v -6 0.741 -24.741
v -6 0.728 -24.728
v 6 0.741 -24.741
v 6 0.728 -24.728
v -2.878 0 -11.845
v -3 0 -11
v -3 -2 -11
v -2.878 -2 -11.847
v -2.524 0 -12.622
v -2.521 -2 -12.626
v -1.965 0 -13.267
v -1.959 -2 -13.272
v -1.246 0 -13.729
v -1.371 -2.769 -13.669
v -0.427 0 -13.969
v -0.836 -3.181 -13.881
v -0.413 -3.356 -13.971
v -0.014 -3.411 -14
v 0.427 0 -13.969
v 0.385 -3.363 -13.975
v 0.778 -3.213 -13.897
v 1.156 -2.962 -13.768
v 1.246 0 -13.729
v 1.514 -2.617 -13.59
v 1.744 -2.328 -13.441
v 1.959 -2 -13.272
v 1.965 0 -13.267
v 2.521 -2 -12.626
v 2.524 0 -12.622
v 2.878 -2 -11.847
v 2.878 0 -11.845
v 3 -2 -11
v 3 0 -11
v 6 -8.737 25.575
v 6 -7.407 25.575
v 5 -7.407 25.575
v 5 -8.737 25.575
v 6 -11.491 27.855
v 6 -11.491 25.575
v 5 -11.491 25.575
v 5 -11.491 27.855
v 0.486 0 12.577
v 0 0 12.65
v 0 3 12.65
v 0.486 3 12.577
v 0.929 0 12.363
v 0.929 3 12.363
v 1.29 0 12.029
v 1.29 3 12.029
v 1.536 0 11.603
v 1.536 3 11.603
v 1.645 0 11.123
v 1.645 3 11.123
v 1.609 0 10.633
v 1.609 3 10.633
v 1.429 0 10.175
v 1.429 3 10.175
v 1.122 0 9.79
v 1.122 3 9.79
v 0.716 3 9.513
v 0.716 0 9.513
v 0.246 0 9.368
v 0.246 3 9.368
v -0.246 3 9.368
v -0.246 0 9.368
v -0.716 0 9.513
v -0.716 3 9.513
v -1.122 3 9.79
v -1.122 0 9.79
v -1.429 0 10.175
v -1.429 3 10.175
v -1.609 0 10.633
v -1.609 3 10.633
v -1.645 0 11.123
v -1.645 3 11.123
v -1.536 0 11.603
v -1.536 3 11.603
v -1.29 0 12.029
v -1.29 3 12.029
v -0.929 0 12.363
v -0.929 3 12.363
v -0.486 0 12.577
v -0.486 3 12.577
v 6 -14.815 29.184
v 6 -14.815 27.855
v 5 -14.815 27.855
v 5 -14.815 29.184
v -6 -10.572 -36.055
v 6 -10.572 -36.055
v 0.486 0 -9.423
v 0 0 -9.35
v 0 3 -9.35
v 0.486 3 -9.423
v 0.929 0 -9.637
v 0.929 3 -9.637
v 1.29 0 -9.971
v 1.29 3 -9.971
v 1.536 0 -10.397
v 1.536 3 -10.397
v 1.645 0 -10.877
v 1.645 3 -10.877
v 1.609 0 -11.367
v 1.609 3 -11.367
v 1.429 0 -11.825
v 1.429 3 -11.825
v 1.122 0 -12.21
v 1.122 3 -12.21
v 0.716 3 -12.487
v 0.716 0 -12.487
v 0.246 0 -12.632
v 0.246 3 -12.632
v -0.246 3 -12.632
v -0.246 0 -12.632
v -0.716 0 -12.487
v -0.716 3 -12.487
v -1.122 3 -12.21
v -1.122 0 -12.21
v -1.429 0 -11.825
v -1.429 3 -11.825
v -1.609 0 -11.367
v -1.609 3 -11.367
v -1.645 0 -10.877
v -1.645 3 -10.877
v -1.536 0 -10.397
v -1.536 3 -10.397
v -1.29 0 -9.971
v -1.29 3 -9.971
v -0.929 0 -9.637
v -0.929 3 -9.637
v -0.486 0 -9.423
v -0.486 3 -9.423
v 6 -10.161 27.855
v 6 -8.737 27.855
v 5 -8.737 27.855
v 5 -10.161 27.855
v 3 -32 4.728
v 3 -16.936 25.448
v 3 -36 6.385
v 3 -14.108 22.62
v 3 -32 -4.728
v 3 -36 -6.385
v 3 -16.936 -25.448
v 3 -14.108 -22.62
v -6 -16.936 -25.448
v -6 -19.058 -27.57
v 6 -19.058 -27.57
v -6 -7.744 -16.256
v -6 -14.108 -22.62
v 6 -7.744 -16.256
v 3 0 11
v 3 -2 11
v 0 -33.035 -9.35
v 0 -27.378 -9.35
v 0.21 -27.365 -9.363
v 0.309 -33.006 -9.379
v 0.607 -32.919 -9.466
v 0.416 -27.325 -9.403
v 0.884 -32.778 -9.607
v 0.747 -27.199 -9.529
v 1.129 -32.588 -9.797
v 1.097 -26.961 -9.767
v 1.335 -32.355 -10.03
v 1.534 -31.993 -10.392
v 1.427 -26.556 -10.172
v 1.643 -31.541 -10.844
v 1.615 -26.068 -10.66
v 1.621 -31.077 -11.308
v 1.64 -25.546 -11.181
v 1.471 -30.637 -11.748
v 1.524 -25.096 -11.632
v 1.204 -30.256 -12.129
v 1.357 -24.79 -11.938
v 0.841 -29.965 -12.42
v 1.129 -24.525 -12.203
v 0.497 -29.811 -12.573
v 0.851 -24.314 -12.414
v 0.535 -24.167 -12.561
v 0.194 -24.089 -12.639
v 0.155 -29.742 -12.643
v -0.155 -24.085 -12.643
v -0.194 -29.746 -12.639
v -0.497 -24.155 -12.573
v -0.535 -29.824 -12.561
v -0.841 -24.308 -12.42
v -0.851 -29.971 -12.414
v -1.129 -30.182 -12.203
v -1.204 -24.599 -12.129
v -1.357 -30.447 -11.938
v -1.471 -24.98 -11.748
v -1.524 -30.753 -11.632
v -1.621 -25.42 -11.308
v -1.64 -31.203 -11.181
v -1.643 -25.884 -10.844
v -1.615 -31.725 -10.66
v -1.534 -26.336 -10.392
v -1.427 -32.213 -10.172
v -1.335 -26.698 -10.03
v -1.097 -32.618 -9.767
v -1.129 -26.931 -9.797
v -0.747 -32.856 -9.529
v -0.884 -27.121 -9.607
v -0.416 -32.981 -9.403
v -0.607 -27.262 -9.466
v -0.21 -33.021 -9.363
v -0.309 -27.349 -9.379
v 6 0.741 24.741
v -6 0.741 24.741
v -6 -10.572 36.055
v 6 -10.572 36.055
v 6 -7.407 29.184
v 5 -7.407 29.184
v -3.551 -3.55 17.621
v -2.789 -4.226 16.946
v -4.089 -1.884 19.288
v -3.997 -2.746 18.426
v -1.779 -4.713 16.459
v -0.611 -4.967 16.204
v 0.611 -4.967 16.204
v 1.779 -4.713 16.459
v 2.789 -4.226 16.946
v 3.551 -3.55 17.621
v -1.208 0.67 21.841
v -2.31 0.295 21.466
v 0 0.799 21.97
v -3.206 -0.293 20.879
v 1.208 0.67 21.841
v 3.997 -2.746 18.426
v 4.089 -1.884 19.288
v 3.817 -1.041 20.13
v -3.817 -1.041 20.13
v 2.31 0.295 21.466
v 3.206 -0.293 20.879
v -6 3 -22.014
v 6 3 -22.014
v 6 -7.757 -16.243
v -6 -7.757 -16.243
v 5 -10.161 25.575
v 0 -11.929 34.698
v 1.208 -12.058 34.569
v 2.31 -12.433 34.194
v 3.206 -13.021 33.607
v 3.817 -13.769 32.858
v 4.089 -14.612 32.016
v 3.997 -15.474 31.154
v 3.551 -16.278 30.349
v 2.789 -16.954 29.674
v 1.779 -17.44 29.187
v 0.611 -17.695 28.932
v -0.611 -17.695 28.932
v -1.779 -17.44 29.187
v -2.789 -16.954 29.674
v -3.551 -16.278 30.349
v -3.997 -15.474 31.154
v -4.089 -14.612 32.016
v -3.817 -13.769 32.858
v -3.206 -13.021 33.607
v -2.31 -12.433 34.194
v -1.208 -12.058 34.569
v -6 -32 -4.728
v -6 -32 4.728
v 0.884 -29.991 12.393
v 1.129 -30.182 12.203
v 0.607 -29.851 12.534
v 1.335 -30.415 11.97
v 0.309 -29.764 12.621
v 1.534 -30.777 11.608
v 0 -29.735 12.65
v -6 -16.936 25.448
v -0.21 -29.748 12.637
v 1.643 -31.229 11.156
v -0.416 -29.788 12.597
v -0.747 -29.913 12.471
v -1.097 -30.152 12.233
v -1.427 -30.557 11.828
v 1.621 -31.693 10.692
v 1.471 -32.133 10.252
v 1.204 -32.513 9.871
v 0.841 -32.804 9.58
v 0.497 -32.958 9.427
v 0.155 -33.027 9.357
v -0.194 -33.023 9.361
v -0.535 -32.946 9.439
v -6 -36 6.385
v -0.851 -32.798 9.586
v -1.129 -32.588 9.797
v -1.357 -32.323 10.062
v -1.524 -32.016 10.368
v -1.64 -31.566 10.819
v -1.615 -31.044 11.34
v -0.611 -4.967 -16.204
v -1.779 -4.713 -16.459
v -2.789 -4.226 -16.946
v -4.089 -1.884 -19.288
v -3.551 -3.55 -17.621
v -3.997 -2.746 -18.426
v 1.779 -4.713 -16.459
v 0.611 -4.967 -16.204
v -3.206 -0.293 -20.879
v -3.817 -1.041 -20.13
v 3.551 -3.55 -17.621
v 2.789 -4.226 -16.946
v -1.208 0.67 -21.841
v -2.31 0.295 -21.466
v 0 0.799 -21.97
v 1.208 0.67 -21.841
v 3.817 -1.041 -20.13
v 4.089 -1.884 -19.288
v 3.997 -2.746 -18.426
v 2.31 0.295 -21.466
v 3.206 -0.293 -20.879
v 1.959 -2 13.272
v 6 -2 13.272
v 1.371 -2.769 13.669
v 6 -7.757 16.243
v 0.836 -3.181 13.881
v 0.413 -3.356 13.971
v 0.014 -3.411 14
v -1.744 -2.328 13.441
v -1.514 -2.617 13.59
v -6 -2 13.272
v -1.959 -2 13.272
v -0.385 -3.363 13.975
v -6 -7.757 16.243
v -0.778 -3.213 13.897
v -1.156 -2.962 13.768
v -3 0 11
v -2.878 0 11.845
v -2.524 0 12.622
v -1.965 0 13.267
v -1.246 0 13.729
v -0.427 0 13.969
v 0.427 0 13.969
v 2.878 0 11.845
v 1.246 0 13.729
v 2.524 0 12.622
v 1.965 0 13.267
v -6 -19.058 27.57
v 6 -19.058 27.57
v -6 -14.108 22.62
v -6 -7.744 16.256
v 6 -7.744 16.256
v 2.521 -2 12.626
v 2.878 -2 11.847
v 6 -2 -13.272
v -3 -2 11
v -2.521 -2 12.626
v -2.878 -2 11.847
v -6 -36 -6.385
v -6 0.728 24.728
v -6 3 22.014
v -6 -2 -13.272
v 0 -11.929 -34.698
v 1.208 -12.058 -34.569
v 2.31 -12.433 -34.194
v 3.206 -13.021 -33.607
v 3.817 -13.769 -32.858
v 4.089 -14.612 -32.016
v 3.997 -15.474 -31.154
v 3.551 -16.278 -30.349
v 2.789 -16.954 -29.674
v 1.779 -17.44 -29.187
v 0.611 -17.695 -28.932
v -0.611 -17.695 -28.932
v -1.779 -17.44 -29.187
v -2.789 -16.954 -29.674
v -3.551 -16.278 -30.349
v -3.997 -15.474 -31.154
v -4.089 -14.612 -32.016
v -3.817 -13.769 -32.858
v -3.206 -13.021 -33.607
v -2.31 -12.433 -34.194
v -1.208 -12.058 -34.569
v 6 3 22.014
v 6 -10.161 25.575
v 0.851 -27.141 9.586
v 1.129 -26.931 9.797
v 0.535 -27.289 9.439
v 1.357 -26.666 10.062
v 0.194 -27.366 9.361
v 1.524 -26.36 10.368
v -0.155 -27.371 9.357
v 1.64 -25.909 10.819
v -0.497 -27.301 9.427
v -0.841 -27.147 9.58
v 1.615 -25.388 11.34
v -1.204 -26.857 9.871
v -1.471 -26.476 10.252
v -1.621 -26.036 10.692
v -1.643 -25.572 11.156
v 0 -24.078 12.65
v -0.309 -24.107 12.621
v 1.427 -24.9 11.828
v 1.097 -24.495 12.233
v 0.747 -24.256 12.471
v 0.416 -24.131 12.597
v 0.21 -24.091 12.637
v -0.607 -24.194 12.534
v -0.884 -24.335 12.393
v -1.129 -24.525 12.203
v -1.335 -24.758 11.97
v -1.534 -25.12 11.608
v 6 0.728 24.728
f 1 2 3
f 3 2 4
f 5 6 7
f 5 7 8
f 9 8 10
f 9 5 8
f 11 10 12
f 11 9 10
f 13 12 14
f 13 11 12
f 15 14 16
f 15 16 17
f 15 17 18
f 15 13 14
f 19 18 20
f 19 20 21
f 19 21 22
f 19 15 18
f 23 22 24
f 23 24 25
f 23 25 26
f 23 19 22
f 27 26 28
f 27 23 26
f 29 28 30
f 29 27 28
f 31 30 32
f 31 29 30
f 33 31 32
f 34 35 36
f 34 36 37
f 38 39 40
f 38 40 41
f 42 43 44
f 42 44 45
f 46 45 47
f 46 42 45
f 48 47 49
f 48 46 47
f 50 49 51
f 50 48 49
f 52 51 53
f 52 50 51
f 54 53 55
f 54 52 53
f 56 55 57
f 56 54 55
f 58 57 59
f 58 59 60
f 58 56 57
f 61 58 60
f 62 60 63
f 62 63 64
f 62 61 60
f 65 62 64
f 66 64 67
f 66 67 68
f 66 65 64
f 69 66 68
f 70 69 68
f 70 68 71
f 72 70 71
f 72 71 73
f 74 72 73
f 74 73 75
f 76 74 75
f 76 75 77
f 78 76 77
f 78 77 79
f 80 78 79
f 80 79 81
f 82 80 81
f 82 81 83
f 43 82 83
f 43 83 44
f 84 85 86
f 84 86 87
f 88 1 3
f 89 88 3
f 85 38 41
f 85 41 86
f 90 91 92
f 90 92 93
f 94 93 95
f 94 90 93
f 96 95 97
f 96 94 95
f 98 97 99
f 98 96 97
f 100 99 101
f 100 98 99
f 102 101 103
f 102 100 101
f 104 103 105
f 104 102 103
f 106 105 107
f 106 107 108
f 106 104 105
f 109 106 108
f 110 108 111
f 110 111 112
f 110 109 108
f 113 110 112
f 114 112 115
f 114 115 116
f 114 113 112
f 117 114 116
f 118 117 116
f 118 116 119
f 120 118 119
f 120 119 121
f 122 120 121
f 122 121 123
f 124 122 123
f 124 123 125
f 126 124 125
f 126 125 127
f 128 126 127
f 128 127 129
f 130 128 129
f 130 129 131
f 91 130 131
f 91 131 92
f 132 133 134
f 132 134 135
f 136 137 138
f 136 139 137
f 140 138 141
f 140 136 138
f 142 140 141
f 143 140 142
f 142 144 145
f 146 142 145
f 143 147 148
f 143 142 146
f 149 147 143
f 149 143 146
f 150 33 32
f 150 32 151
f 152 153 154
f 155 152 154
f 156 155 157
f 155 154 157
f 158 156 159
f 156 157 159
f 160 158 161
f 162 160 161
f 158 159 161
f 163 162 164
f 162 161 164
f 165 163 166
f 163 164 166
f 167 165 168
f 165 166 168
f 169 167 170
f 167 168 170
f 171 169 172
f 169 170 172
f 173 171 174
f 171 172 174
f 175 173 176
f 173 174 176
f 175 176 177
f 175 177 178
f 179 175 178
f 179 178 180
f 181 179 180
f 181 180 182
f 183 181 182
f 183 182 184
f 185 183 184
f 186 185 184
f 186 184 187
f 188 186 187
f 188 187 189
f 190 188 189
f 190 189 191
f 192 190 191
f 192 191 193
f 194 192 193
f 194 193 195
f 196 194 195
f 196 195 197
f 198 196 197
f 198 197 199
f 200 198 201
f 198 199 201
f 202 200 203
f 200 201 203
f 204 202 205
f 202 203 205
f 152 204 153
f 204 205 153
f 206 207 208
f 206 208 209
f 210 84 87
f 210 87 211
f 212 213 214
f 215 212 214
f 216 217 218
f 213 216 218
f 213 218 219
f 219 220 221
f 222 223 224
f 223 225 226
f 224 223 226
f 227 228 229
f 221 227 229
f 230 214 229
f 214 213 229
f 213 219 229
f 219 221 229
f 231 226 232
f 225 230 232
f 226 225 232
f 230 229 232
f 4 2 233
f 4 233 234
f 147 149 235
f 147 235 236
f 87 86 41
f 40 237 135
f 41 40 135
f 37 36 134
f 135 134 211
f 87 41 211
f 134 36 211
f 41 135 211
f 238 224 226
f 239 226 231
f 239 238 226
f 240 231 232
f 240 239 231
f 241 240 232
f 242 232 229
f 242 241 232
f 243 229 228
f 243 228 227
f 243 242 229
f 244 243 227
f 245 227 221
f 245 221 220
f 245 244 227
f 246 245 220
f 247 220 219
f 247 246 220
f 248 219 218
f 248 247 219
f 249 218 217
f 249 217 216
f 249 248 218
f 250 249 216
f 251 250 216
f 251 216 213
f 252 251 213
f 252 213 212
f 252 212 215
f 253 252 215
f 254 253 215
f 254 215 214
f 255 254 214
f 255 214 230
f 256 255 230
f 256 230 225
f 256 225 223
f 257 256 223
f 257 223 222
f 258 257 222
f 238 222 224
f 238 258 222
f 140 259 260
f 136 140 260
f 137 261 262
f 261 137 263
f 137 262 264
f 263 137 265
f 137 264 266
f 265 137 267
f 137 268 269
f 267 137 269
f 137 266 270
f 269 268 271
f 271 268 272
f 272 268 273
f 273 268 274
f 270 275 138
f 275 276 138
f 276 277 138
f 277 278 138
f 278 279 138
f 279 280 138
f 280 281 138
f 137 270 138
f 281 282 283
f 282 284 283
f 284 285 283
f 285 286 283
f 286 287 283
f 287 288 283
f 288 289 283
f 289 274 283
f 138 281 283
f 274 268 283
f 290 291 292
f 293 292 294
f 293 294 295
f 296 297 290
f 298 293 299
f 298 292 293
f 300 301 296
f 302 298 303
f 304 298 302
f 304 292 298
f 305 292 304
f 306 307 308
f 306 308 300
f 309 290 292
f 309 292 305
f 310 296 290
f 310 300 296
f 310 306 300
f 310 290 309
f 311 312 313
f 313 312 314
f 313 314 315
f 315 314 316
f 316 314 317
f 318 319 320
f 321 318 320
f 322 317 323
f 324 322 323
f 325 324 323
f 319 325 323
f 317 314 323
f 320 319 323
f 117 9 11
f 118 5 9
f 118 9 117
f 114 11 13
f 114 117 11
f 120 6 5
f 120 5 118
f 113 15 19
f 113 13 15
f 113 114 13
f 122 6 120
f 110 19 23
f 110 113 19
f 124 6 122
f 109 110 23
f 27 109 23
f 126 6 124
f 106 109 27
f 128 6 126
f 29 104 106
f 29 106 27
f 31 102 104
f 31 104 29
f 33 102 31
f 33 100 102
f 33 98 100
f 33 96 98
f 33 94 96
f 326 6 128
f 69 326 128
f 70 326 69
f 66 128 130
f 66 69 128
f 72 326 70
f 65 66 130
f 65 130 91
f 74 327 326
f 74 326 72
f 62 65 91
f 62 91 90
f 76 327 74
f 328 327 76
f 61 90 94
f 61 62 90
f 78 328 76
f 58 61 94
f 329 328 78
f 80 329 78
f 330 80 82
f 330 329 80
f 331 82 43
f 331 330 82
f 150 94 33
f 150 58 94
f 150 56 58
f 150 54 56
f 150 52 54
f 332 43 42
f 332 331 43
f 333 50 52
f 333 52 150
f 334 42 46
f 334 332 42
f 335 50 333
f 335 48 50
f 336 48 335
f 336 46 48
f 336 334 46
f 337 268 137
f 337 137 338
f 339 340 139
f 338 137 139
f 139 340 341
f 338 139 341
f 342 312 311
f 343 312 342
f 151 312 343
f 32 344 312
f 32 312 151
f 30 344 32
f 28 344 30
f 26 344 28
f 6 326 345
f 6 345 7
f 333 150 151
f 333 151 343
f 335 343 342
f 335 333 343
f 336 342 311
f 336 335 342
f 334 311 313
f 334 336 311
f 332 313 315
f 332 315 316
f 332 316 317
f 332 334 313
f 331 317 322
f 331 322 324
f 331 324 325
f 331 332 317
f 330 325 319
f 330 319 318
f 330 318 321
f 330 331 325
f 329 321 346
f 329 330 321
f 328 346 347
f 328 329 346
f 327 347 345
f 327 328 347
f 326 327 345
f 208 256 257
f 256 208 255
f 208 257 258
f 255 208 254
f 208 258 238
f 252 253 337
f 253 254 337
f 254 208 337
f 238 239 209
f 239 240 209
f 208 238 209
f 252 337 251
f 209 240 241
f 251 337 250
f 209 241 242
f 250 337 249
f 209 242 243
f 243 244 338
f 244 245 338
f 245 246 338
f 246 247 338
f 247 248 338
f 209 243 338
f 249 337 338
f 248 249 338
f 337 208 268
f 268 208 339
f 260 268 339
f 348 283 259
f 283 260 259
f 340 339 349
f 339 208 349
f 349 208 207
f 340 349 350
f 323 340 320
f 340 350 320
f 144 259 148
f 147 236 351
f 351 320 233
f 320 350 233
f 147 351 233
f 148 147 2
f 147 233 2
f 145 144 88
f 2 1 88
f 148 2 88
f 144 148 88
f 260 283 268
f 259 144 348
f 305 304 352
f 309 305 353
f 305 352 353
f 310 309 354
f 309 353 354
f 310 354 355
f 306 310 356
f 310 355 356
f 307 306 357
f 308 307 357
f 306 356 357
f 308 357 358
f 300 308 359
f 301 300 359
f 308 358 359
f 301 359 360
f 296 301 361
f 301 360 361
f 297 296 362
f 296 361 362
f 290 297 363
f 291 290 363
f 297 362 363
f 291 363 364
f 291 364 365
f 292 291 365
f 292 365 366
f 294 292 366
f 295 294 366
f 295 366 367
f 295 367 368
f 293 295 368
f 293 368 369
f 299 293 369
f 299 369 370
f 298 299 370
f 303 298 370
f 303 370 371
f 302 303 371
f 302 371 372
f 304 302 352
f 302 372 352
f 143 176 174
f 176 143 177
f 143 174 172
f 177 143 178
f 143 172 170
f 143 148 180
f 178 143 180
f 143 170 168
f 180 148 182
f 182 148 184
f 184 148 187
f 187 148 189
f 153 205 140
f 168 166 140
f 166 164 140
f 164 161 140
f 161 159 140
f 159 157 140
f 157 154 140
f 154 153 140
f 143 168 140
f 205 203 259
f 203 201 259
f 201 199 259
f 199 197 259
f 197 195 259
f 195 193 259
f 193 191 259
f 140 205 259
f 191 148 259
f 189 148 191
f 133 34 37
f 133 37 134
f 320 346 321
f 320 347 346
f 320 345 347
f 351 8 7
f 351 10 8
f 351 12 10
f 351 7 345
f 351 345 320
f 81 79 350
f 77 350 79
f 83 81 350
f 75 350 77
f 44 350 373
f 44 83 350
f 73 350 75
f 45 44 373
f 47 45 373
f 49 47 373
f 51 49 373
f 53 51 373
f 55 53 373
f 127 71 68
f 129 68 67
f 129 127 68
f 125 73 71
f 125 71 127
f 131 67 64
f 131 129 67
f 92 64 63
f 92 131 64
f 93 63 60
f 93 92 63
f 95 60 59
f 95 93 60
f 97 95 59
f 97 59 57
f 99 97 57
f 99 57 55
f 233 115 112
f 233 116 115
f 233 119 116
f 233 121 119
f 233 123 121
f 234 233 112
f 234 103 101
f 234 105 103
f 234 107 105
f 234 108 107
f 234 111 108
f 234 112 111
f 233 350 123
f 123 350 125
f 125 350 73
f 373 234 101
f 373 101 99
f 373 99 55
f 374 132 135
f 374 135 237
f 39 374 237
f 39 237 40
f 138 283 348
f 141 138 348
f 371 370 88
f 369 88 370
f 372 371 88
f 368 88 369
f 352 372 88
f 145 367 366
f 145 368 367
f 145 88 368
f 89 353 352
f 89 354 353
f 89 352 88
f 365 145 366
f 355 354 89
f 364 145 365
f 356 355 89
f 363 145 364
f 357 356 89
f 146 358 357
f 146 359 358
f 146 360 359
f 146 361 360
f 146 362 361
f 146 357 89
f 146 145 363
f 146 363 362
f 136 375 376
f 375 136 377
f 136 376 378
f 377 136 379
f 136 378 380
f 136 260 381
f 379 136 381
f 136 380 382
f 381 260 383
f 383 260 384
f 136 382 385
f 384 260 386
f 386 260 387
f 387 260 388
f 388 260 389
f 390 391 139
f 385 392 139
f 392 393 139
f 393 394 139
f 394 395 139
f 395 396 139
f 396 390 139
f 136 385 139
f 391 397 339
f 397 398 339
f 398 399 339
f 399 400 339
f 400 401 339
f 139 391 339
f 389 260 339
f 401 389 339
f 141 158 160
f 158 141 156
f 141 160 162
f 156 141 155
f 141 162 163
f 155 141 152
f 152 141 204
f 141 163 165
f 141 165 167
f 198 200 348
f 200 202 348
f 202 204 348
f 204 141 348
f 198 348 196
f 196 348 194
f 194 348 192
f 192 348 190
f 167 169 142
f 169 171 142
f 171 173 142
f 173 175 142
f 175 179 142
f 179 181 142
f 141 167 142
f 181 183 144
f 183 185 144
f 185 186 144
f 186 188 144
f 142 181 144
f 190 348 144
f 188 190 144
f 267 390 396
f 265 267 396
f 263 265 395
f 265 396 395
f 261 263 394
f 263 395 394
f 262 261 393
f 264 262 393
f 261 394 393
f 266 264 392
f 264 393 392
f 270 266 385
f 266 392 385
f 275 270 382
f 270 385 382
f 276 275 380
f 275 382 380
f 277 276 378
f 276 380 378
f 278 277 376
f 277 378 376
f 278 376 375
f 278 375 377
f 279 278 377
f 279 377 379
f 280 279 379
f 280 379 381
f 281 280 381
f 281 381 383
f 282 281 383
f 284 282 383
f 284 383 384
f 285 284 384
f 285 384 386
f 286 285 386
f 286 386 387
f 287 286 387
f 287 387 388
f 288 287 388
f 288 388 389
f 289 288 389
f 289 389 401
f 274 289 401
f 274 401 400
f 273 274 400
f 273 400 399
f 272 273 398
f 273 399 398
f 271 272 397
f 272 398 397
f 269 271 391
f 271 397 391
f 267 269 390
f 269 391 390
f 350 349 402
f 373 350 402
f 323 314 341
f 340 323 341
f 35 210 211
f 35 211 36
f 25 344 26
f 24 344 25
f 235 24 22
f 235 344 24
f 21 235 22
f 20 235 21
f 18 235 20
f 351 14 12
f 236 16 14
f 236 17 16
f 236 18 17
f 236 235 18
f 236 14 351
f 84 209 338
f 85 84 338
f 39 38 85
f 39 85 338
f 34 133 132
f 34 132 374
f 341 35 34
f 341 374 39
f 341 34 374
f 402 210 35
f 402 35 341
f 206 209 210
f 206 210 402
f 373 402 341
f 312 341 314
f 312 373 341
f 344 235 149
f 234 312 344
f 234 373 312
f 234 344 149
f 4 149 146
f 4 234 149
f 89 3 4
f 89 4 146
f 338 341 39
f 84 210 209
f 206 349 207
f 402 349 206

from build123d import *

# Parameters (mm, degrees)
SZKIC2_R                         = 1.65
DODANIE_WYCI_GNI_CIE1_DEPTH      = 3
DODANIE_WYCI_GNI_CIE2_DEPTH      = 5
DODANIE_WYCI_GNI_CIE3_REACH      = 30.62
DODANIE_WYCI_GNI_CIE3_START      = -1
SZKIC7_R                         = 5
SZKIC9_W                         = 12
SZKIC9_H                         = 12
DODANIE_WYCI_GNI_CIE4_DEPTH      = 16
SZKIC10_R                        = 4.1
WYTNIJ_WYCI_GNI_CIE1_DEPTH       = 18
SZKIC12_R                        = 37.17284924
WYTNIJ_WYCI_GNI_CIE2_DEPTH       = 43.690783477
SZKIC13_R                        = 3
WYTNIJ_WYCI_GNI_CIE3_DEPTH       = 42.220824259
SZKIC14_R                        = 1.65
WYTNIJ_WYCI_GNI_CIE4_DEPTH       = 42.220824259
DODANIE_WYCI_GNI_CIE5_DEPTH      = 3
DODANIE_WYCI_GNI_CIE5_DEPTH_BACK = 6
DODANIE_WYCI_GNI_CIE6_REACH      = 55.451
SZKIC16_W                        = 12
SZKIC16_H                        = 5.223766812
SZKIC17_R                        = 1.65
WYTNIJ_WYCI_GNI_CIE5_DEPTH       = 54.450515696
WYTNIJ_WYCI_GNI_CIE6_DEPTH       = 1


with BuildPart() as part:
    # Szkic2 → Dodanie-wyciągnięcie1 (new body)
    with BuildSketch(Plane(origin=(0, 0, 0), x_dir=(1, 0, 0), z_dir=(0, 1, 0))):
        with BuildLine():
            Line((4, 11), (4, -11))
            ThreePointArc((4, -11), (0, -15), (-4, -11))
            Line((-4, -11), (-4, 11))
            ThreePointArc((-4, 11), (0, 15), (4, 11))
        make_face()
        with Locations(Location((0, -11, 0), (0, 0, 270))):
            Circle(SZKIC2_R, mode=Mode.SUBTRACT)
        with Locations(Location((0, 11, 0), (0, 0, 270))):
            Circle(SZKIC2_R, mode=Mode.SUBTRACT)
    extrude(amount=DODANIE_WYCI_GNI_CIE1_DEPTH)

    # Szkic3 → Dodanie-wyciągnięcie2 (add)
    with BuildSketch(Plane(origin=(0, 3, 0), x_dir=(1, 0, 0), z_dir=(0, 1, 0))):
        Polygon((6, 16), (6, -14), (6, -20), (-6, -20), (-6, -14), (-6, 16), (-6, 22), (6, 22), align=None)
        with BuildLine():
            Line((3, 11), (3, -11))
            ThreePointArc((3, -11), (0, -14), (-3, -11))
            Line((-3, -11), (-3, 11))
            ThreePointArc((-3, 11), (0, 14), (3, 11))
        make_face(mode=Mode.SUBTRACT)
    extrude(amount=-DODANIE_WYCI_GNI_CIE2_DEPTH)

    # Dodanie-wyciągnięcie3: up to this face of the body (flat: up to its plane)
    dodanie_wyci_gni_cie3_end = Plane(part.part.faces().sort_by_distance((0, 0, 0))[0])
    # Szkic7 → Dodanie-wyciągnięcie3 (add, up to the picked face)
    with BuildSketch(Plane(origin=(0, -7.995190528, -4.616025404), x_dir=(1, 0, 0), z_dir=(0, -0.866025403784438, -0.500000000000001)).offset(DODANIE_WYCI_GNI_CIE3_START), mode=Mode.PRIVATE) as dodanie_wyci_gni_cie3_sk1:
        with Locations((0, -15.5)):
            Circle(SZKIC7_R)
    dodanie_wyci_gni_cie3_tool1 = split(extrude(dodanie_wyci_gni_cie3_sk1.sketch, amount=-DODANIE_WYCI_GNI_CIE3_REACH, mode=Mode.PRIVATE), bisect_by=dodanie_wyci_gni_cie3_end, keep=Keep.BOTH, mode=Mode.PRIVATE)
    dodanie_wyci_gni_cie3 = dodanie_wyci_gni_cie3_tool1.solids().sort_by(Axis((0, 0.620835, -17.539419), (0, 0.866025403784438, 0.500000000000001)))[0]
    add(dodanie_wyci_gni_cie3)

    # Szkic8 → Wyciągnięcie po profilach1 section 0
    with BuildSketch(Plane(origin=(0, -7.129165125, -4.116025404), x_dir=(-1, 0, 0), z_dir=(0, 0.8660254037844382, 0.5000000000000011))):
        with BuildLine():
            Line((-6, -20.5), (-6, -10.5))
            Line((-6, -10.5), (6, -10.5))
            Line((6, -10.5), (6, -20.5))
            Line((6, -20.5), (-6, -20.5))
        make_face()
    # Szkic5 → Wyciągnięcie po profilach1 section 1
    with BuildSketch(Plane(origin=(0, -12, -12), x_dir=(1, 0, 0), z_dir=(0, 0.7071067811865464, 0.7071067811865488))):
        with BuildLine():
            Line((-6, 18), (-6, 6))
            Line((-6, 6), (6, 6))
            Line((6, 6), (6, 18))
            Line((6, 18), (-6, 18))
        make_face()
    wyci_gni_cie_po_profilach1 = loft()

    # Szkic9 → Dodanie-wyciągnięcie4 (add)
    with BuildSketch(Plane(origin=(0, -12, -12), x_dir=(1, 0, 0), z_dir=(0, -0.7071067811865465, -0.7071067811865487))):
        with Locations((0, -12.018801083)):
            Rectangle(SZKIC9_W, SZKIC9_H)
    dodanie_wyci_gni_cie4 = extrude(amount=DODANIE_WYCI_GNI_CIE4_DEPTH)

    # Szkic10 → Wytnij-wyciągnięcie1 (cut)
    with BuildSketch(Plane(origin=(0, -23.313708499, -23.313708499), x_dir=(1, 0, 0), z_dir=(0, -0.7071067811865465, -0.7071067811865486))):
        with Locations(Location((0, -12, 0), (0, 0, 270))):
            Circle(SZKIC10_R)
    wytnij_wyci_gni_cie1 = extrude(amount=-WYTNIJ_WYCI_GNI_CIE1_DEPTH, mode=Mode.SUBTRACT)

    # Szkic12 → Wytnij-wyciągnięcie2 (cut, through all)
    with BuildSketch(Plane(origin=(0, 3, 0), x_dir=(1, 0, 0), z_dir=(0, 1, 0))):
        Circle(SZKIC12_R)
    wytnij_wyci_gni_cie2 = extrude(amount=WYTNIJ_WYCI_GNI_CIE2_DEPTH, mode=Mode.SUBTRACT)

    # Szkic13 → Wytnij-wyciągnięcie3 (cut, through all)
    with BuildSketch(Plane.XZ):
        with Locations((0, -11)):
            Circle(SZKIC13_R)
    wytnij_wyci_gni_cie3 = extrude(amount=WYTNIJ_WYCI_GNI_CIE3_DEPTH, mode=Mode.SUBTRACT)

    # Lustro1: Dodanie-wyciągnięcie3, Wyciągnięcie po profilach1, Dodanie-wyciągnięcie4, Wytnij-wyciągnięcie1, Wytnij-wyciągnięcie2, Wytnij-wyciągnięcie3 across plane
    add(dodanie_wyci_gni_cie3.mirror(Plane.XY))
    add(wyci_gni_cie_po_profilach1.mirror(Plane.XY))
    add(dodanie_wyci_gni_cie4.mirror(Plane.XY))
    add(wytnij_wyci_gni_cie1.mirror(Plane.XY), mode=Mode.SUBTRACT)
    add(wytnij_wyci_gni_cie2.mirror(Plane.XY), mode=Mode.SUBTRACT)
    add(wytnij_wyci_gni_cie3.mirror(Plane.XY), mode=Mode.SUBTRACT)

    # Szkic14 → Wytnij-wyciągnięcie4 (cut, through all)
    with BuildSketch(Plane.XZ):
        with Locations(Location((0, 11, 0), (0, 0, 90))):
            Circle(SZKIC14_R)
    extrude(amount=-WYTNIJ_WYCI_GNI_CIE4_DEPTH, mode=Mode.SUBTRACT)

    # Szkic15 → Dodanie-wyciągnięcie5 (add, two sides: drawn at the far end of the back side and taken through both)
    with BuildSketch(Plane(origin=(0, 0, 0), x_dir=(0, 0, -1), z_dir=(1, 0, 0)).offset(-DODANIE_WYCI_GNI_CIE5_DEPTH_BACK)):
        Polygon((-25.448323216, -16.936453095), (-6.384776311, -36), (6.384776311, -36), (25.448323216, -16.936453095), (22.619896091, -14.10802597), (4.727922061, -32), (-4.727922061, -32), (-22.619896091, -14.10802597), align=None)
    extrude(amount=DODANIE_WYCI_GNI_CIE5_DEPTH + DODANIE_WYCI_GNI_CIE5_DEPTH_BACK)

    # Szkic16 → Dodanie-wyciągnięcie6 (add, up to next)
    with BuildSketch(Plane(origin=(0, 3, 0), x_dir=(1, 0, 0), z_dir=(0, 1, 0)), mode=Mode.PRIVATE) as dodanie_wyci_gni_cie6_sk1:
        with Locations((0, -19.402002131)):
            Rectangle(SZKIC16_W, SZKIC16_H)
    dodanie_wyci_gni_cie6_tool1 = extrude(dodanie_wyci_gni_cie6_sk1.sketch, amount=-DODANIE_WYCI_GNI_CIE6_REACH, mode=Mode.PRIVATE) - part.part
    add(dodanie_wyci_gni_cie6_tool1.solids().sort_by_distance((0, 3, 19.402002))[0])

    # Szkic17 → Wytnij-wyciągnięcie5 (cut, through all)
    with BuildSketch(Plane(origin=(0, 3, 0), x_dir=(1, 0, 0), z_dir=(0, 1, 0))):
        with Locations(Location((0, 11, 0), (0, 0, 270))):
            Circle(SZKIC17_R)
        with Locations(Location((0, -11, 0), (0, 0, 270))):
            Circle(SZKIC17_R)
    extrude(amount=-WYTNIJ_WYCI_GNI_CIE5_DEPTH, mode=Mode.SUBTRACT)

    # Szkic18 → Wytnij-wyciągnięcie6 (cut)
    with BuildSketch(Plane.ZY.offset(-6)):
        Polygon((29.184280312, -7.406799418), (25.575092277, -7.406799418), (25.575092277, -8.736500273), (27.854579457, -8.736500273), (27.854579457, -10.16117976), (25.575092277, -10.16117976), (25.575092277, -11.490880615), (27.854579457, -11.490880615), (27.854579457, -14.815132751), (29.184280312, -14.815132751), align=None)
    extrude(amount=WYTNIJ_WYCI_GNI_CIE6_DEPTH, mode=Mode.SUBTRACT)


solid = part.part
